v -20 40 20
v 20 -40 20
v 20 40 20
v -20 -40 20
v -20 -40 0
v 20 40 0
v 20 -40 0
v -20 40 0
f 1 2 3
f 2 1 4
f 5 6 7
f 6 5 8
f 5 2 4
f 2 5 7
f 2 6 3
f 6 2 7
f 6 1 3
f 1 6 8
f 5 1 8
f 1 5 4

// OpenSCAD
// -------------------------------------+---------------------------------------+---------------------------------------+---------------------------------------
// Title:        Box
// Version:      1.0
// Release Date: 2017-06-05 (ISO)
// Author:       Rohin Gosling
// -------------------------------------+---------------------------------------+---------------------------------------+---------------------------------------
//
// Description:
//
// - Simple box and lid.
//
// Release Notes:
//
// - Version 1.0
//   * Model created.
//
// -------------------------------------+---------------------------------------+---------------------------------------+---------------------------------------

// -------------------------------------+---------------------------------------+---------------------------------------+---------------------------------------
// Constants:
// -------------------------------------+---------------------------------------+---------------------------------------+---------------------------------------

// System constants.

C_CONSTANT = 0 + 0;     // Used to hide constant values from Thingiverse. Add to other constants to hide them as well.

// General constants.

C_NONE = C_CONSTANT + 0;

// SCG constants.

SCG_OVERLAP = C_CONSTANT + 0.01;    // Used for overlapping Boolean operations in order to avoid Boolean edge artefacts.

// Minimum and maximum constraints.

C_RESOLUTION_MIN = C_CONSTANT + 16;
C_RESOLUTION_MAX = C_CONSTANT + 256;


// -------------------------------------+---------------------------------------+---------------------------------------+---------------------------------------
// Thingiverse Parameters.
//
// - These parameters are used to integrate with the Thingiverse Customizer, and should only be used by the
//   class member variables specified in the "Model parameters" section below.
//
// - These Thingiverse Parameters should never be accessed from inside any module. We do this to enforce 
//   principles of object orientation.
//
// - By separating concerns between variables exposed to Thingiverse vs. variables used internally by the 
//   SCAD model (class), we are better able to manage the ordering and grouping of variables exposed to 
//   Thingiverse, vs. the ordering of variables used internally by the model.
//
// -------------------------------------+---------------------------------------+---------------------------------------+---------------------------------------

/* [Assembly Options] */

resolution                   = 128;
component_color              = "white";

/* [Object Parameters] */


// -------------------------------------+---------------------------------------+---------------------------------------+---------------------------------------
// Model parameters and geometric constraints. (Class member variables).
//
// - If we treat an OpenSCAD file as though it is an object oriented class, then we can prefix global variables
//   with "m_", to denote class membership. 
//   - As an alternative to "m_", we could also use "this_" as a standard. However, "m_" is shorter and faster to type.
//   - Another advantage of this convention, is that we can arrange parameters meant for display in Thingiverse, in 
//     an order that makes sense to the user, while arranging the member versions of the parameters in an order
//     that better accommodates constraint computation.
//
// - Once we have defined global variables as member variables of a class, in this case the class represented
//   by the SCAD file, then we are free to better manage global vs local scope of class member 
//   variables, vs. local module (method) variables.
//
// - Thingiverse only integrates constant literal values. So as long as we reference other parameters or 
//   initialize variables as expressions, then none of these will appear in the Thingiverse customizer.
//
// -------------------------------------+---------------------------------------+---------------------------------------+---------------------------------------

// Assembly Options.

m_resolution               = clip ( resolution, C_RESOLUTION_MIN, C_RESOLUTION_MAX );
m_component_color          = component_color;

// Object Parameters

m_width  = 40;
m_length = 80;
m_height = 20;



// -------------------------------------+---------------------------------------+---------------------------------------+---------------------------------------
// DEBUG: Console Output. 
// -------------------------------------+---------------------------------------+---------------------------------------+---------------------------------------

C_DEBUG_ENABLED = false;

if ( C_DEBUG_ENABLED )
{
    //echo ( m_x = m_x ); 
}

// -------------------------------------+---------------------------------------+---------------------------------------+---------------------------------------
// Module:      Main
// Module Type: Model
//
// Description:
//
// - Program entry point.
//
// -------------------------------------+---------------------------------------+---------------------------------------+---------------------------------------

main();

module main ()
{   
    // Initialize model resolution.
    
    $fn = m_resolution;
    
    // Generate hinge assembly.
    
    assembly ();
    
}

// -------------------------------------+---------------------------------------+---------------------------------------+---------------------------------------
// Module:      assembly_main
// Module Type: Assembly
//
// Description:
//
// - Main component assembly.
//
// Parameters:
//
// - N/A
//
// -------------------------------------+---------------------------------------+---------------------------------------+---------------------------------------

module assembly ()
{
    color ( m_component_color );
    
    translate ( [ -m_width/2, -m_length/2, 0] )
    {
        cube ( [ m_width, m_length, m_height] );
    }
}



// -------------------------------------+---------------------------------------+---------------------------------------+---------------------------------------
// Module:      Rectangle.
// Module Type: 2D Shape.
//
// Description:
//
// - Creates a 2D rectangle.
//
// Parameters:
//
// - w
//   Rectangle width.
//
// - h
//   Rectangle height.
//
// - center
//   Center the rectangle about the origin (0,0,0) if true, else place the rectangle in the positive quadrant.
//
// -------------------------------------+---------------------------------------+---------------------------------------+---------------------------------------

module fillet_rectangle ( w, h, r, center )
{
    xs = w - 2*r;
    ys = h - 2*r;
    xd = w/2.0 - r;  
    yd = h/2.0 - r;    
    
    union ()
    {
        scale ( [ xs, h  ] ) square ( size = 1.0, center = center );
        scale ( [ w,  ys ] ) square ( size = 1.0, center = center );
        translate ( [  xd,  yd ] ) circle ( r = r, center = center );
        translate ( [  xd, -yd ] ) circle ( r = r, center = center );
        translate ( [ -xd, -yd ] ) circle ( r = r, center = center );
        translate ( [ -xd,  yd ] ) circle ( r = r, center = center );
    }
}

// -------------------------------------+---------------------------------------+---------------------------------------+---------------------------------------
// Module:      Rectangle.
// Module Type: 2D Shape.
//
// Description:
//
// - Creates a 2D rectangle.
//
// Parameters:
//
// - w
//   Rectangle width.
//
// - h
//   Rectangle height.
//
// - center
//   Center the rectangle about the origin (0,0,0) if true, else place the rectangle in the positive quadrant.
//
// -------------------------------------+---------------------------------------+---------------------------------------+---------------------------------------

module rectangle ( w, h, center )
{
    scale ( [ w, h ] ) square ( size = 1.0, center = center );
}

// -------------------------------------+---------------------------------------+---------------------------------------+---------------------------------------
// Function: Clip
//
// Description:
//
// - Clips an input value, to a minimum and maximum value.
//
//   x_min ≤ x ≤ x_max
// 
// Parameters:
//
// - x
//   Input value.
//
// - x_min
//   Minimal value constraint. Any x less than x_min, is set to x_min. 
//
// - x_max
//   Maximum value constraint. Any x greater than x_max, is set to x_max.
//
// -------------------------------------+---------------------------------------+---------------------------------------+---------------------------------------

function clip ( x, x_min, x_max ) = ( x < x_min ) ? x_min : ( x > x_max ) ? x_max : x;


// -------------------------------------+---------------------------------------+---------------------------------------+---------------------------------------
// Function: funtion_name
//
// Description:
//
// - Function description.
//
// Return Value:
//
// - Description of return value.
//
// Parameters:
//
// - x
//   Argument x description.
//
// - y
//   Argument y description.
//
// -------------------------------------+---------------------------------------+---------------------------------------+---------------------------------------

// -------------------------------------+---------------------------------------+---------------------------------------+---------------------------------------
// Module:      module_name
// Module Type: [ 2D Shape, Profile, Tool, Workpiece, Component ] 
// Description:
//
// - Module description.
//
// Parameters:
//
// - x
//   Argument x description.
//
// - y
//   Argument y description.
//
// -------------------------------------+---------------------------------------+---------------------------------------+---------------------------------------
